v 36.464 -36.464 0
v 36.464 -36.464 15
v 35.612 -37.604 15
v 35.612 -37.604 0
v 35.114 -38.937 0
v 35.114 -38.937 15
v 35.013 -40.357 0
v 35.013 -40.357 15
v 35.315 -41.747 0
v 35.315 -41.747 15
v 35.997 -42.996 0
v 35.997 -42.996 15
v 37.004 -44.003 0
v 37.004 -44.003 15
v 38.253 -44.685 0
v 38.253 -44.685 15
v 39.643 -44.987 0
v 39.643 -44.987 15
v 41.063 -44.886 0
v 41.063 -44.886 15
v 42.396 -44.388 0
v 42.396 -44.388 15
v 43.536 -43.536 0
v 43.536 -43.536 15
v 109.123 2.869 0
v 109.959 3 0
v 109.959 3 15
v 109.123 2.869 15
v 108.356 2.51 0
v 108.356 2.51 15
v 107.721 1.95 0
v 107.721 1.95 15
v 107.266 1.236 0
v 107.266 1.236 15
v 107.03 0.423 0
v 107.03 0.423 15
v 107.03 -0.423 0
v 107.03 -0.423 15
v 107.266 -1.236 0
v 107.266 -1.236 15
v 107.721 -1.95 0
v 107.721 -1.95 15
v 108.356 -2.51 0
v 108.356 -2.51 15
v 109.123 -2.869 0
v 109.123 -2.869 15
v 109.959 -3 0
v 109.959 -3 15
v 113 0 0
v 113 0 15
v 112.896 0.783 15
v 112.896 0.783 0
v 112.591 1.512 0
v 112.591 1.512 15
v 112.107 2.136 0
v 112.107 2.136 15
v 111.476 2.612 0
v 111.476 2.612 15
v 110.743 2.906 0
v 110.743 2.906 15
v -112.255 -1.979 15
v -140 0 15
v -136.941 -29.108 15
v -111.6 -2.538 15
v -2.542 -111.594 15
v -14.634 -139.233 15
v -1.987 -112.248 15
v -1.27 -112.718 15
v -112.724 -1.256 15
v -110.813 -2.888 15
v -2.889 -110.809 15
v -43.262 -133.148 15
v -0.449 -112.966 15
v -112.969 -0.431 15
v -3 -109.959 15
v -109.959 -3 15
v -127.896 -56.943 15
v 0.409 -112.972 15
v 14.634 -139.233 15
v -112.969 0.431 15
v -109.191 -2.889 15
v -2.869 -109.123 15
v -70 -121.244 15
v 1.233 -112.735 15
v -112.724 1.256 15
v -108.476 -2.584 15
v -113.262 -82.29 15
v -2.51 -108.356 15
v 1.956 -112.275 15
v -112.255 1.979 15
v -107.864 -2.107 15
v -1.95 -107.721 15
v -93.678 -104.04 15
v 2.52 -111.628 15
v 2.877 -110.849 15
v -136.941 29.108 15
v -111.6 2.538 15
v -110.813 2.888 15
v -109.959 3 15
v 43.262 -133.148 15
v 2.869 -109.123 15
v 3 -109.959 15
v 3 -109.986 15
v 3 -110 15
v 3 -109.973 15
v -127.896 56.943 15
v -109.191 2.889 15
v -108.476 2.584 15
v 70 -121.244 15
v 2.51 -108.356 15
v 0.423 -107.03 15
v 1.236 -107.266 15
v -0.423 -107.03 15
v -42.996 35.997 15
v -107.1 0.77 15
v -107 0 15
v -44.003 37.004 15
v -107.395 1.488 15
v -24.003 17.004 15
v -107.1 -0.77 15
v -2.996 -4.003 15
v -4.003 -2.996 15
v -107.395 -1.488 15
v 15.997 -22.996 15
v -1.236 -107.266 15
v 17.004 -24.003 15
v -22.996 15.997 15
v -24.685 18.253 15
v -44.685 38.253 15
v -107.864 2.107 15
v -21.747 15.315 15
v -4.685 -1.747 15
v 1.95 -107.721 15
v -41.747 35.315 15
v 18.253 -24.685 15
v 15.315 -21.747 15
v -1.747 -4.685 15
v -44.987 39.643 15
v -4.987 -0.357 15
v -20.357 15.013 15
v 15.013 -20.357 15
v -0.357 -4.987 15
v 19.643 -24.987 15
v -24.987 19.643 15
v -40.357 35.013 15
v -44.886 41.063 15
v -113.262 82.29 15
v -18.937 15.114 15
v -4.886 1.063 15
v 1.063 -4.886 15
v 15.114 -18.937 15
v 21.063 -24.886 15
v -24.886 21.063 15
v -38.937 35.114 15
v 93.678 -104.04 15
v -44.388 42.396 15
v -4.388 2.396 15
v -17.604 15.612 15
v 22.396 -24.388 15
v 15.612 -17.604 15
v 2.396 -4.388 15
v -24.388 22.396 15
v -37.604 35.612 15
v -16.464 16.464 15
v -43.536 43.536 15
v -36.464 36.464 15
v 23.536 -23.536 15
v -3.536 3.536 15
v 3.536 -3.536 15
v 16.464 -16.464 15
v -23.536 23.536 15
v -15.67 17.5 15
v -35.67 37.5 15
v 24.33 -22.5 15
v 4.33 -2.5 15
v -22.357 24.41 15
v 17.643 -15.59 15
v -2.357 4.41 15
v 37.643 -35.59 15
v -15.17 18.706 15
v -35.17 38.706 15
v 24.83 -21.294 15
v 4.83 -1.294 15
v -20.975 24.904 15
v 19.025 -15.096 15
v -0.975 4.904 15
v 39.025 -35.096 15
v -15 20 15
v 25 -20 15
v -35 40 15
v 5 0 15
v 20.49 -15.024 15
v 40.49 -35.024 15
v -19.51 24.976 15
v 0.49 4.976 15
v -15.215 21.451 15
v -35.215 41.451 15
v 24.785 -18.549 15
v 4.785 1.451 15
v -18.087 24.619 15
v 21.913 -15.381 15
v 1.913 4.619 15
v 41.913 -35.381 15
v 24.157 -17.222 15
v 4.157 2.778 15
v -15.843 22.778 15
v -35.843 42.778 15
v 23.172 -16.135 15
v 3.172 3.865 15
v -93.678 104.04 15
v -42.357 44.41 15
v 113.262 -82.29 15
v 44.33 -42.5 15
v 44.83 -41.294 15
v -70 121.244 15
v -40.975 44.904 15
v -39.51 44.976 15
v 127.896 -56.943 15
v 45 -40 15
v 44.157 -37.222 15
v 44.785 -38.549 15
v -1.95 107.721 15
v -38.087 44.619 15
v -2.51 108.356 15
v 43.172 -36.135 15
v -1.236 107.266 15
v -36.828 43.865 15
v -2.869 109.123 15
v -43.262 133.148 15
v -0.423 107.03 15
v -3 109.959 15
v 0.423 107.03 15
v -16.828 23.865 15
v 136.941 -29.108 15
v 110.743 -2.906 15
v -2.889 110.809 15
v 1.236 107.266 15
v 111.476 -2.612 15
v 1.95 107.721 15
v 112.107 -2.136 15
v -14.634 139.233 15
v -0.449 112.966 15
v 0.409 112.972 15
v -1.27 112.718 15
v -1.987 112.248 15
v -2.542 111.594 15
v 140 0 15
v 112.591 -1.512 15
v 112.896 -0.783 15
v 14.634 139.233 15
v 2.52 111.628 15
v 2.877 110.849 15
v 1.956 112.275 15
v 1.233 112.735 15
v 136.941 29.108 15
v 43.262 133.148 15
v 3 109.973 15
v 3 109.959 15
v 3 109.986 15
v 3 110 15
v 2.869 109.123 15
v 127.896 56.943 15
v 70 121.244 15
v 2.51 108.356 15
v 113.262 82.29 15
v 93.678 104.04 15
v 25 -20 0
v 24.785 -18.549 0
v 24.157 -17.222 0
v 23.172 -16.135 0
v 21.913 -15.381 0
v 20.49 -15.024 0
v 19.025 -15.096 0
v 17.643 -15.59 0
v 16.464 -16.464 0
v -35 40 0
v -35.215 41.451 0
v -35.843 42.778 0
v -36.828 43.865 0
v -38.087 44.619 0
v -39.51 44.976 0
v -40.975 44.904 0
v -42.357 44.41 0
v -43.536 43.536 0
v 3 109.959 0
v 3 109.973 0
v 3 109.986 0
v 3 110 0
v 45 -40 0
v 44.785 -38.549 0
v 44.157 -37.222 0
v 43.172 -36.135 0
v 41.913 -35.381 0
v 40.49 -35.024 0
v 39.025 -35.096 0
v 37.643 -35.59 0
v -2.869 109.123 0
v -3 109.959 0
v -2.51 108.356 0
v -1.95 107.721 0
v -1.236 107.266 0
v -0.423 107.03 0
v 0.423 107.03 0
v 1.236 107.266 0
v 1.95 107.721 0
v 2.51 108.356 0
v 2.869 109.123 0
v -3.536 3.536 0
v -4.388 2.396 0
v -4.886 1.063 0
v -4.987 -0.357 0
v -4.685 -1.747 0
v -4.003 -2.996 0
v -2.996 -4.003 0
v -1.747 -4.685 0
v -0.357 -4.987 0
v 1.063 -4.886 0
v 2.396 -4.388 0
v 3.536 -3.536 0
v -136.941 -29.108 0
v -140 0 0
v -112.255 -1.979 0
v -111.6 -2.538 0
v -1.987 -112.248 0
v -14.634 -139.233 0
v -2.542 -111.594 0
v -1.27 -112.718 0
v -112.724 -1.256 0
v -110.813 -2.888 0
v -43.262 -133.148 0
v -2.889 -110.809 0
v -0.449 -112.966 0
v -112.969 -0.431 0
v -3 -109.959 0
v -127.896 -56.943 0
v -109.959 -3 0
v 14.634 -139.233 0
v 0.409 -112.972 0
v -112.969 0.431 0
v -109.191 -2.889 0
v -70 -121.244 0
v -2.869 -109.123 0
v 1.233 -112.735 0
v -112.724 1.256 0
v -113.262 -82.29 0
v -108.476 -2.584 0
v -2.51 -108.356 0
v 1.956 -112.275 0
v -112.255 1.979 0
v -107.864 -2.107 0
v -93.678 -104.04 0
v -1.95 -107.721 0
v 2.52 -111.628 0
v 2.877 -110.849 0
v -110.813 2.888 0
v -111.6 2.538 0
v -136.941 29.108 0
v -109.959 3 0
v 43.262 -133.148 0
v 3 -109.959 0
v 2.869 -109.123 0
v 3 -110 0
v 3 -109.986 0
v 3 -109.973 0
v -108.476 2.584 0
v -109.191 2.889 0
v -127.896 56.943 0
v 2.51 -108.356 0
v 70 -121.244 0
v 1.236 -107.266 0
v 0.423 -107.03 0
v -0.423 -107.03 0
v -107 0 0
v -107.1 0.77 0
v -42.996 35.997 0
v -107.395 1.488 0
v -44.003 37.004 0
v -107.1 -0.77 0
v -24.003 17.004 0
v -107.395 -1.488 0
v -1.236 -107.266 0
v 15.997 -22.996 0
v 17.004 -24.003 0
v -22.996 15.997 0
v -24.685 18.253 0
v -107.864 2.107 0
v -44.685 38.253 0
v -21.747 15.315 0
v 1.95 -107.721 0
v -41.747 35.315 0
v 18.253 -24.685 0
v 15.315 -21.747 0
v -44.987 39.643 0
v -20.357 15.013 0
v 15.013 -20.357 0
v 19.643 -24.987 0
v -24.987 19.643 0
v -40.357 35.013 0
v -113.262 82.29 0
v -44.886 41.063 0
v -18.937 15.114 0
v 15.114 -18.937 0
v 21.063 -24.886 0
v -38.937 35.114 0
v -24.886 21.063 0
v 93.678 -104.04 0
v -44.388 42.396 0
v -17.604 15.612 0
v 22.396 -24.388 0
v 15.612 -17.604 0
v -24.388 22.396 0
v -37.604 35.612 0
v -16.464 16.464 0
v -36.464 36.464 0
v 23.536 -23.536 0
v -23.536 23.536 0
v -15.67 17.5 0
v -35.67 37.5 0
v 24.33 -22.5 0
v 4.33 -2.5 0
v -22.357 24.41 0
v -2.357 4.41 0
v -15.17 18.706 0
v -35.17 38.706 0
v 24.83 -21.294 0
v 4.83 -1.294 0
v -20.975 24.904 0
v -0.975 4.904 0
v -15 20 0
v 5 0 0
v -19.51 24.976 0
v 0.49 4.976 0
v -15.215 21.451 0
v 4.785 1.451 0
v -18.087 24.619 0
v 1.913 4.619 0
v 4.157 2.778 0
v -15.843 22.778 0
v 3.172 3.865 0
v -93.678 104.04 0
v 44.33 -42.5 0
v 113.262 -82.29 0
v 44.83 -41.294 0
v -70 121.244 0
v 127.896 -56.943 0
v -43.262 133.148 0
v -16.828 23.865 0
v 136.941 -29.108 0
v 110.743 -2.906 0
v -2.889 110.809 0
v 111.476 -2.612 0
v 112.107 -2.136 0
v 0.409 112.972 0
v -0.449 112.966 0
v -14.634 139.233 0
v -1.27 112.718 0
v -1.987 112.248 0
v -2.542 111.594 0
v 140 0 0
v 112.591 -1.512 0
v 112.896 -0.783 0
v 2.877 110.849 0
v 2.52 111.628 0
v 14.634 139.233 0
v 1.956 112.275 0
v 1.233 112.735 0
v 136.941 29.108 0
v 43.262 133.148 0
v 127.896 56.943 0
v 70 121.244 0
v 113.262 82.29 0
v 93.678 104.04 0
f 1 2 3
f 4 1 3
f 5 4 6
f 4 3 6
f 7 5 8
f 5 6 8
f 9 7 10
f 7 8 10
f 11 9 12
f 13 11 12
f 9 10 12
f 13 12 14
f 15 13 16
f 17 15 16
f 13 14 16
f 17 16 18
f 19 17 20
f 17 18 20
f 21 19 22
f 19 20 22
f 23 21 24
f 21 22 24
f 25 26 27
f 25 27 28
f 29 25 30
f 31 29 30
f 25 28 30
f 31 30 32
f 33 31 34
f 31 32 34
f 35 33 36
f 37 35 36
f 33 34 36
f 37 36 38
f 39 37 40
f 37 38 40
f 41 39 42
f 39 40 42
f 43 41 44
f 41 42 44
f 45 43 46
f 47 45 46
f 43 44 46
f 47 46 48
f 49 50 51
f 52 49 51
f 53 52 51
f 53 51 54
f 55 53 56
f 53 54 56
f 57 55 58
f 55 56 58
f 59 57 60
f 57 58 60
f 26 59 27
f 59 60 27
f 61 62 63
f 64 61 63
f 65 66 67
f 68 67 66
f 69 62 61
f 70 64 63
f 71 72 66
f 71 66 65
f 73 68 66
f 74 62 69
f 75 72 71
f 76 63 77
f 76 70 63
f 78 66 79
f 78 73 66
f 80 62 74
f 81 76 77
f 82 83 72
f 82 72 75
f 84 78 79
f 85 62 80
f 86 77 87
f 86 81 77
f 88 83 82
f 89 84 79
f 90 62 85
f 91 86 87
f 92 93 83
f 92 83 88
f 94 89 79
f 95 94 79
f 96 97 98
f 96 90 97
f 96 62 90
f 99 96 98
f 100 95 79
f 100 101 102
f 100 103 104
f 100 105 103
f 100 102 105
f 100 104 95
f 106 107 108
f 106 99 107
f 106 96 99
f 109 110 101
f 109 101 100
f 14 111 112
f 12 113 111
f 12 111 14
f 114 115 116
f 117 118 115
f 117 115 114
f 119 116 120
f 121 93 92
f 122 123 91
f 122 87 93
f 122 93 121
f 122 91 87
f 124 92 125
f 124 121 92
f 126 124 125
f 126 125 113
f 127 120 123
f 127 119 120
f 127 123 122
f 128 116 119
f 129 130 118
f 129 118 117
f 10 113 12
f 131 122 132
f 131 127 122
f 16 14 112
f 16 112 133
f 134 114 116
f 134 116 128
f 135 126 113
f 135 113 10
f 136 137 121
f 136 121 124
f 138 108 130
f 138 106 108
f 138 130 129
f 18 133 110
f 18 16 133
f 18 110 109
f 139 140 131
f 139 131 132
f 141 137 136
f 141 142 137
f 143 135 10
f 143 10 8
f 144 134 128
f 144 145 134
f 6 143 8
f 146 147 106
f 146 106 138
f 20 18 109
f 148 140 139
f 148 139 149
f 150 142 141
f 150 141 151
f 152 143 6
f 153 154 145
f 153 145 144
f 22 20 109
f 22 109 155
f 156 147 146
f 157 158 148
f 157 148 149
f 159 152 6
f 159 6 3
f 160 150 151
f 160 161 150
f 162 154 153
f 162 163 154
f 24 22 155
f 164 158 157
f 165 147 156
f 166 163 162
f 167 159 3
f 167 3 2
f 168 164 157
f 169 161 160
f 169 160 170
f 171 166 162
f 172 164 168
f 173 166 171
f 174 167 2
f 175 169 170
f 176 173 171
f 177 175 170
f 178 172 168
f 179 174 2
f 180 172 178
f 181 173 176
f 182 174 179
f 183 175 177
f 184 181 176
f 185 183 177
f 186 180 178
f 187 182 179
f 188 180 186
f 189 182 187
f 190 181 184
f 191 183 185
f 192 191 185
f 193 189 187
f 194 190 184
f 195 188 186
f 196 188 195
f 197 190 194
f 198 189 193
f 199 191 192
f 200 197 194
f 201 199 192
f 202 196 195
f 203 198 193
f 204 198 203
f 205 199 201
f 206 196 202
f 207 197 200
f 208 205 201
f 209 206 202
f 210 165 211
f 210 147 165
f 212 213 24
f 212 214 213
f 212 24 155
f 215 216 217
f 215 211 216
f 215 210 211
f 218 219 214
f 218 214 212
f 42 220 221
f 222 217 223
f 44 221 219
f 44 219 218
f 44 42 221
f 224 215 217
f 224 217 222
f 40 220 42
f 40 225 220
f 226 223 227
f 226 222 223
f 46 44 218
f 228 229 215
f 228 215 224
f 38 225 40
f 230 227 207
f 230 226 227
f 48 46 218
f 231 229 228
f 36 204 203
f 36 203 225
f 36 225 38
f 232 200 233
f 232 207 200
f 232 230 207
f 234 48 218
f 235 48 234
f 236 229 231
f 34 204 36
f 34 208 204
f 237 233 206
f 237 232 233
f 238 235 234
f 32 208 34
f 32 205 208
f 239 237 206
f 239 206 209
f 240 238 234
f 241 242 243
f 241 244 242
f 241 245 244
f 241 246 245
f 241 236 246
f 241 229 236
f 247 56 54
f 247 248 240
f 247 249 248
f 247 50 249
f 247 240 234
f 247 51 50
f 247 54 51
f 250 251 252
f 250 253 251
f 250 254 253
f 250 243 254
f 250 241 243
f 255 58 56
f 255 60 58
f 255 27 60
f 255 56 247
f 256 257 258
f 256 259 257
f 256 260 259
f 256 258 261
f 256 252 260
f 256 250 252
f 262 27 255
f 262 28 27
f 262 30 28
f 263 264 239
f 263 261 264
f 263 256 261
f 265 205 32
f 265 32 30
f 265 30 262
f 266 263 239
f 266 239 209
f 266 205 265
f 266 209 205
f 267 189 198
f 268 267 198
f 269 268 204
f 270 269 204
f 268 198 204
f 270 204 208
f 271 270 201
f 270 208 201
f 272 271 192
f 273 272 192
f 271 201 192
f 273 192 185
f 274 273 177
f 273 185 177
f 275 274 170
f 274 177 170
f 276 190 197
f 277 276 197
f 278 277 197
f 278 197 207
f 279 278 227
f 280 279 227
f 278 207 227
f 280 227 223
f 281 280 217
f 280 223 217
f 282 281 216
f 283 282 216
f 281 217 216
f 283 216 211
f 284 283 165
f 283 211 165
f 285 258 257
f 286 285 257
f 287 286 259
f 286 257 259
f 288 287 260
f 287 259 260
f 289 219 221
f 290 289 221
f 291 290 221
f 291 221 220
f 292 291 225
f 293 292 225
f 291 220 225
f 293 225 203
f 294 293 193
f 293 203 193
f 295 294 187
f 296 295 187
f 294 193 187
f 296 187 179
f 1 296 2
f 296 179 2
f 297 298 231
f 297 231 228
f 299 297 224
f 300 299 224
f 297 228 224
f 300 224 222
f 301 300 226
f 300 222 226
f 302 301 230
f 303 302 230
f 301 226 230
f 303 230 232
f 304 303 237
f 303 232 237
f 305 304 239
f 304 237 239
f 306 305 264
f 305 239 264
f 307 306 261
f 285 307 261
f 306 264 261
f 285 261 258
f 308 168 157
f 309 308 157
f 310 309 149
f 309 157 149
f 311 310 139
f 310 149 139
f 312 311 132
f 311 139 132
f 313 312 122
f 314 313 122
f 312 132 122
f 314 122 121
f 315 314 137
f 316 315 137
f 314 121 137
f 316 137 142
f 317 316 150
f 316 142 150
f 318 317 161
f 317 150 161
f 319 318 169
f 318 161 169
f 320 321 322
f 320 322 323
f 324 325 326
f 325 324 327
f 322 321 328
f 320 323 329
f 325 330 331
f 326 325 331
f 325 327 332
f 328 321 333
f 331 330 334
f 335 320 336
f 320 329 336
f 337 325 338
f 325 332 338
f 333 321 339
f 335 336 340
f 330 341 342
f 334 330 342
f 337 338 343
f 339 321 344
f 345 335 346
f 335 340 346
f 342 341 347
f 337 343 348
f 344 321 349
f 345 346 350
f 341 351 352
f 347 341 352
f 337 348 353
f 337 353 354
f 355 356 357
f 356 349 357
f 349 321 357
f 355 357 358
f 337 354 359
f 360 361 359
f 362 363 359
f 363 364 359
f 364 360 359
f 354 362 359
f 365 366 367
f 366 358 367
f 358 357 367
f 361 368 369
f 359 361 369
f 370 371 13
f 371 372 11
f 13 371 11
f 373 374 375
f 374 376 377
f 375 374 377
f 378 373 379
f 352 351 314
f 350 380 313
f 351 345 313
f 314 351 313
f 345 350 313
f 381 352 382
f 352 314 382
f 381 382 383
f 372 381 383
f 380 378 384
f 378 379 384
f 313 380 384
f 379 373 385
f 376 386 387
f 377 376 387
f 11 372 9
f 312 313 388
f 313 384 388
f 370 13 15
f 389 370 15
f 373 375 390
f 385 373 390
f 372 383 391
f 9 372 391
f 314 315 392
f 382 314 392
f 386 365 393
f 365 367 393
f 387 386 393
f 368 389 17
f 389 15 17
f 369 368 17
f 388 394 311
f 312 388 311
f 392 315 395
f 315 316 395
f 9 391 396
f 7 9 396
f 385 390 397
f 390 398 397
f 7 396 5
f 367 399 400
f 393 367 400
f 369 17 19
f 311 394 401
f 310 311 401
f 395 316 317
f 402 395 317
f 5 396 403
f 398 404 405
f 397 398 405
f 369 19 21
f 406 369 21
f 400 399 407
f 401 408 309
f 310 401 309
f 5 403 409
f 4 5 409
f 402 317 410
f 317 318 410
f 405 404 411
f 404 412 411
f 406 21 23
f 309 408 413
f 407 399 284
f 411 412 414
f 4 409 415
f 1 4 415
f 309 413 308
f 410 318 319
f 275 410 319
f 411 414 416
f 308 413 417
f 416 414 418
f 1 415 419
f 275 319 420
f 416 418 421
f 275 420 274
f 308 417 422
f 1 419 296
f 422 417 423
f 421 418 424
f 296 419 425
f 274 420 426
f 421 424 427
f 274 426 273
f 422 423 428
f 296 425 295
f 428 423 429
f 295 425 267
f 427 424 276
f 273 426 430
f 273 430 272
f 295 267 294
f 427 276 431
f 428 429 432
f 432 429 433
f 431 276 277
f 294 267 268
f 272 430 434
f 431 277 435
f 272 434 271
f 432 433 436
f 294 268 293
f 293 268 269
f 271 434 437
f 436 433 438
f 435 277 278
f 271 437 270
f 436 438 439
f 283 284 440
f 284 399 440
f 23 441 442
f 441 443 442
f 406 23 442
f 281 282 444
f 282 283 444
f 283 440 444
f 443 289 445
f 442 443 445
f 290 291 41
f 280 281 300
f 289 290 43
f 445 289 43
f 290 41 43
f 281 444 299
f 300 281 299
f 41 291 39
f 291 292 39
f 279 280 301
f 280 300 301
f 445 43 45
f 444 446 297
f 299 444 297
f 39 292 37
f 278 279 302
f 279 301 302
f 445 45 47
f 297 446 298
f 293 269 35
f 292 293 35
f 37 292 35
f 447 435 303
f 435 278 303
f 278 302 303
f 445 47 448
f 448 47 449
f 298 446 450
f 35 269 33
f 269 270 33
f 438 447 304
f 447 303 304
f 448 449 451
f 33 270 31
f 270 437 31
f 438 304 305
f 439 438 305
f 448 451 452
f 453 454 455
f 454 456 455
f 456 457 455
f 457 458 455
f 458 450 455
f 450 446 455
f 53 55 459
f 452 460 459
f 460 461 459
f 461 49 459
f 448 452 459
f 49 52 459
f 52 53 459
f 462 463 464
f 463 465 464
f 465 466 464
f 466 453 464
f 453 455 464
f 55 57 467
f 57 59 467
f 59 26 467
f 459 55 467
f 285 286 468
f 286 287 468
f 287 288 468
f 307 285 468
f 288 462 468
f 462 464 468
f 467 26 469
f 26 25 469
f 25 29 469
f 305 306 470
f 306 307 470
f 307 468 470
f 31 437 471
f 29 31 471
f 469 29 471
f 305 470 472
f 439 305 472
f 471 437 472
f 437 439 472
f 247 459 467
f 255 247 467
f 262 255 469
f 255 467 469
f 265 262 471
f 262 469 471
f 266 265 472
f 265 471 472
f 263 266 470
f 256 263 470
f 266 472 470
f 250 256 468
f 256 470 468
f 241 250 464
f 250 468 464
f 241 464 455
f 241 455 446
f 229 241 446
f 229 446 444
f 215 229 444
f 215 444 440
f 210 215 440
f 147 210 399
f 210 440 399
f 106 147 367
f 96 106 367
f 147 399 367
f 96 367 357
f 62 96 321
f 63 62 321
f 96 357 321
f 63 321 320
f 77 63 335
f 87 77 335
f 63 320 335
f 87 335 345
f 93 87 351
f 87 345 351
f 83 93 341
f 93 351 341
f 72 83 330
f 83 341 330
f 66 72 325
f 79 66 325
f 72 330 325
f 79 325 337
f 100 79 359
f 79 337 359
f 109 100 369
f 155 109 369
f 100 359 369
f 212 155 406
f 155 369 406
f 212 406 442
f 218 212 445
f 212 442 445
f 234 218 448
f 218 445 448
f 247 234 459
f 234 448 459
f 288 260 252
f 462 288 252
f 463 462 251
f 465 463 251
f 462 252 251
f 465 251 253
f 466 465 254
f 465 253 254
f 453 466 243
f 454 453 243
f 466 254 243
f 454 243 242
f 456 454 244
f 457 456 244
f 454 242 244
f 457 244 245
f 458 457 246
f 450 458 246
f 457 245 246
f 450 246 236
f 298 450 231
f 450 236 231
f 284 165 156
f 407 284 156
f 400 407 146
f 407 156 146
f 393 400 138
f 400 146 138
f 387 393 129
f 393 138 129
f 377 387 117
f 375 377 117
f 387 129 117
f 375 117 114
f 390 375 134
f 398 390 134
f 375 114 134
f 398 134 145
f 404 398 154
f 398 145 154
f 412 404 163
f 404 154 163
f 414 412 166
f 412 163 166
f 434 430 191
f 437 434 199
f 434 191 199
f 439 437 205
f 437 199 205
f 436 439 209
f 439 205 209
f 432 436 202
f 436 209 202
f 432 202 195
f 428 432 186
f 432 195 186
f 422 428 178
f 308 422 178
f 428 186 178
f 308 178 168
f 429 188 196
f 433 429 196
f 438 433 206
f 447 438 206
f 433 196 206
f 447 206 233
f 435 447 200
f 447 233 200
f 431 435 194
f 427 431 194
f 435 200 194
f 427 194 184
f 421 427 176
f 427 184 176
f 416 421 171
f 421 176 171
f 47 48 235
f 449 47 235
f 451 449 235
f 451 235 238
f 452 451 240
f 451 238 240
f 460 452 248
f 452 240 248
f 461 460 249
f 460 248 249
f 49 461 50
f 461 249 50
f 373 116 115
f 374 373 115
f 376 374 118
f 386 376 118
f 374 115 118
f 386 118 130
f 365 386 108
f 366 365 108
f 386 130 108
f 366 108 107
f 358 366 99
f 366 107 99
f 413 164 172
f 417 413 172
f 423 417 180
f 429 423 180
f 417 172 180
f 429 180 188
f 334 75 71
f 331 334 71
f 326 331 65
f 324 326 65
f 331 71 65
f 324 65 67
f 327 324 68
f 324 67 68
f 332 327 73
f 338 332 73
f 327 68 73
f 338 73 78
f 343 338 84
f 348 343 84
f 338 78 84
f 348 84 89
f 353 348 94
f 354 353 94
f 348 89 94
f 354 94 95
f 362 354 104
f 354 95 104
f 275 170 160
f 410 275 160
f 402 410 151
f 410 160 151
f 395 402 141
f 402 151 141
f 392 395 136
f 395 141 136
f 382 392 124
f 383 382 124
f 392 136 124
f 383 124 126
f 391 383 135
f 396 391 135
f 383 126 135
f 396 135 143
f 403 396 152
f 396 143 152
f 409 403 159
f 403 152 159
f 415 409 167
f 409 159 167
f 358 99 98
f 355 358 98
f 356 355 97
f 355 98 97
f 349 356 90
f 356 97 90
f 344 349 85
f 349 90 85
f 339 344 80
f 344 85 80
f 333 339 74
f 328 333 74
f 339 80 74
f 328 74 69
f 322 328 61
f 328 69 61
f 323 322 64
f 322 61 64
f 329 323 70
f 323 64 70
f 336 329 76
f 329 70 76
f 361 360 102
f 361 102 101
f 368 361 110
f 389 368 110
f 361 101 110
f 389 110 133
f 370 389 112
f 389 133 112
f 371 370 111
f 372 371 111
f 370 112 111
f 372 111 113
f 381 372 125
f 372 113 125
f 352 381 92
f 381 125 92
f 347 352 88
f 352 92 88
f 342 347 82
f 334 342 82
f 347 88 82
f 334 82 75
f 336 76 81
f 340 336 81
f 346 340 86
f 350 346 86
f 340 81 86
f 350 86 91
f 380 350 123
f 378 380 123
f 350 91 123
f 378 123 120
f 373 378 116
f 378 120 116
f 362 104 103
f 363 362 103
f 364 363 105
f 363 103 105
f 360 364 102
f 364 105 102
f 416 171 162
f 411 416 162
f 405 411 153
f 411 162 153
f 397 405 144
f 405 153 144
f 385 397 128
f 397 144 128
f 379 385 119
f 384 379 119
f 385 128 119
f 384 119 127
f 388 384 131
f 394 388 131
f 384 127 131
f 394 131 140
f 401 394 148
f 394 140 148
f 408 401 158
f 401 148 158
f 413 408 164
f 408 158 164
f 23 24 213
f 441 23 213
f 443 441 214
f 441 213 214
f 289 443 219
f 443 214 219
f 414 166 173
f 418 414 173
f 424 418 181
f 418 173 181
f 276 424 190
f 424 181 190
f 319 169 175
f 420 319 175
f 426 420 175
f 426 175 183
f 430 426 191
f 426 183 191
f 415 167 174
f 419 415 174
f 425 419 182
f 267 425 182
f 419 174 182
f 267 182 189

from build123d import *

# Parameters (mm, degrees)
F0_R     = 140
F1_DEPTH = 15
F3_DEPTH = 15.001
F5_DEPTH = 15.001


with BuildPart() as f1:
    # F0 (on Top) → F1 (new body)
    with BuildSketch(Plane.XY):
        Circle(F0_R)
    extrude(amount=F1_DEPTH)

    # F2 (on face) → F3 (cut, through all)
    with BuildSketch(Plane.XY.offset(15)):
        with BuildLine():
            ThreePointArc((-107, 0), (-107.8642650828, 2.1068071491), (-109.9590909091, 2.9997210614))
            ThreePointArc((-109.9590909091, 2.9997210614), (-110, 0), (-109.9590909091, -2.9997210614))
            ThreePointArc((-109.9590909091, -2.9997210614), (-107.8642650828, -2.1068071491), (-107, 0))
        make_face()
        with BuildLine():
            ThreePointArc((-109.9590909091, -2.9997210614), (-110, 0), (-109.9590909091, 2.9997210614))
            ThreePointArc((-109.9590909091, 2.9997210614), (-113, 0), (-109.9590909091, -2.9997210614))
        make_face()
        with BuildLine():
            ThreePointArc((-2.9997210614, 109.9590909091), (0, 110), (2.9997210614, 109.9590909091))
            ThreePointArc((2.9997210614, 109.9590909091), (2.9999302645, 109.9795449791), (3, 110))
            ThreePointArc((3, 110), (-0.0204550209, 112.9999302645), (-2.9997210614, 109.9590909091))
        make_face()
        with BuildLine():
            ThreePointArc((-2.9997210614, 109.9590909091), (0, 107), (2.9997210614, 109.9590909091))
            ThreePointArc((2.9997210614, 109.9590909091), (0, 110), (-2.9997210614, 109.9590909091))
        make_face()
        with BuildLine():
            ThreePointArc((-2.9997210614, -109.9590909091), (0, -110), (2.9997210614, -109.9590909091))
            ThreePointArc((2.9997210614, -109.9590909091), (0, -107), (-2.9997210614, -109.9590909091))
        make_face()
        with BuildLine():
            ThreePointArc((3, -110), (2.9999302645, -109.9795449791), (2.9997210614, -109.9590909091))
            ThreePointArc((2.9997210614, -109.9590909091), (0, -110), (-2.9997210614, -109.9590909091))
            ThreePointArc((-2.9997210614, -109.9590909091), (-0.0204550209, -112.9999302645), (3, -110))
        make_face()
        with BuildLine():
            ThreePointArc((109.9590909091, -2.9997210614), (109.9897722518, -1.5), (110, 0))
            ThreePointArc((110, 0), (109.9897722518, 1.5), (109.9590909091, 2.9997210614))
            ThreePointArc((109.9590909091, 2.9997210614), (107, 0), (109.9590909091, -2.9997210614))
        make_face()
        with BuildLine():
            ThreePointArc((109.9590909091, 2.9997210614), (109.9897722518, 1.5), (110, 0))
            ThreePointArc((110, 0), (109.9897722518, -1.5), (109.9590909091, -2.9997210614))
            ThreePointArc((109.9590909091, -2.9997210614), (112.1068071491, -2.1357349172), (113, 0))
            ThreePointArc((113, 0), (112.1068071491, 2.1357349172), (109.9590909091, 2.9997210614))
        make_face()
    extrude(amount=-F3_DEPTH, mode=Mode.SUBTRACT)

    # F4 (on face) → F5 (cut, through all)
    with BuildSketch(Plane.XY.offset(15)):
        with BuildLine():
            Line((3.5355339059, -3.5355339059), (0, 0))
            Line((0, 0), (-3.5355339059, 3.5355339059))
            ThreePointArc((-3.5355339059, 3.5355339059), (-3.5355339059, -3.5355339059), (3.5355339059, -3.5355339059))
        make_face()
        with BuildLine():
            Line((-3.5355339059, 3.5355339059), (0, 0))
            Line((0, 0), (3.5355339059, -3.5355339059))
            ThreePointArc((3.5355339059, -3.5355339059), (4.6193976626, -1.9134171618), (5, 0))
            ThreePointArc((5, 0), (1.9134171618, 4.6193976626), (-3.5355339059, 3.5355339059))
        make_face()
        with BuildLine():
            ThreePointArc((-43.5355339059, 43.5355339059), (-43.5355339059, 36.4644660941), (-36.4644660941, 36.4644660941))
            Line((-36.4644660941, 36.4644660941), (-43.5355339059, 43.5355339059))
        make_face()
        with BuildLine():
            Line((-43.5355339059, 43.5355339059), (-36.4644660941, 36.4644660941))
            ThreePointArc((-36.4644660941, 36.4644660941), (-35.3806023374, 38.0865828382), (-35, 40))
            ThreePointArc((-35, 40), (-38.0865828382, 44.6193976626), (-43.5355339059, 43.5355339059))
        make_face()
        with BuildLine():
            ThreePointArc((-23.5355339059, 23.5355339059), (-23.5355339059, 16.4644660941), (-16.4644660941, 16.4644660941))
            Line((-16.4644660941, 16.4644660941), (-23.5355339059, 23.5355339059))
        make_face()
        with BuildLine():
            Line((-23.5355339059, 23.5355339059), (-16.4644660941, 16.4644660941))
            ThreePointArc((-16.4644660941, 16.4644660941), (-15.3806023374, 18.0865828382), (-15, 20))
            ThreePointArc((-15, 20), (-18.0865828382, 24.6193976626), (-23.5355339059, 23.5355339059))
        make_face()
        with BuildLine():
            ThreePointArc((45, -40), (41.9134171618, -35.3806023374), (36.4644660941, -36.4644660941))
            Line((36.4644660941, -36.4644660941), (43.5355339059, -43.5355339059))
            ThreePointArc((43.5355339059, -43.5355339059), (44.6193976626, -41.9134171618), (45, -40))
        make_face()
        with BuildLine():
            Line((43.5355339059, -43.5355339059), (36.4644660941, -36.4644660941))
            ThreePointArc((36.4644660941, -36.4644660941), (36.4644660941, -43.5355339059), (43.5355339059, -43.5355339059))
        make_face()
        with BuildLine():
            ThreePointArc((25, -20), (21.9134171618, -15.3806023374), (16.4644660941, -16.4644660941))
            Line((16.4644660941, -16.4644660941), (23.5355339059, -23.5355339059))
            ThreePointArc((23.5355339059, -23.5355339059), (24.6193976626, -21.9134171618), (25, -20))
        make_face()
        with BuildLine():
            Line((23.5355339059, -23.5355339059), (16.4644660941, -16.4644660941))
            ThreePointArc((16.4644660941, -16.4644660941), (16.4644660941, -23.5355339059), (23.5355339059, -23.5355339059))
        make_face()
    extrude(amount=-F5_DEPTH, mode=Mode.SUBTRACT)


solid = f1.part
